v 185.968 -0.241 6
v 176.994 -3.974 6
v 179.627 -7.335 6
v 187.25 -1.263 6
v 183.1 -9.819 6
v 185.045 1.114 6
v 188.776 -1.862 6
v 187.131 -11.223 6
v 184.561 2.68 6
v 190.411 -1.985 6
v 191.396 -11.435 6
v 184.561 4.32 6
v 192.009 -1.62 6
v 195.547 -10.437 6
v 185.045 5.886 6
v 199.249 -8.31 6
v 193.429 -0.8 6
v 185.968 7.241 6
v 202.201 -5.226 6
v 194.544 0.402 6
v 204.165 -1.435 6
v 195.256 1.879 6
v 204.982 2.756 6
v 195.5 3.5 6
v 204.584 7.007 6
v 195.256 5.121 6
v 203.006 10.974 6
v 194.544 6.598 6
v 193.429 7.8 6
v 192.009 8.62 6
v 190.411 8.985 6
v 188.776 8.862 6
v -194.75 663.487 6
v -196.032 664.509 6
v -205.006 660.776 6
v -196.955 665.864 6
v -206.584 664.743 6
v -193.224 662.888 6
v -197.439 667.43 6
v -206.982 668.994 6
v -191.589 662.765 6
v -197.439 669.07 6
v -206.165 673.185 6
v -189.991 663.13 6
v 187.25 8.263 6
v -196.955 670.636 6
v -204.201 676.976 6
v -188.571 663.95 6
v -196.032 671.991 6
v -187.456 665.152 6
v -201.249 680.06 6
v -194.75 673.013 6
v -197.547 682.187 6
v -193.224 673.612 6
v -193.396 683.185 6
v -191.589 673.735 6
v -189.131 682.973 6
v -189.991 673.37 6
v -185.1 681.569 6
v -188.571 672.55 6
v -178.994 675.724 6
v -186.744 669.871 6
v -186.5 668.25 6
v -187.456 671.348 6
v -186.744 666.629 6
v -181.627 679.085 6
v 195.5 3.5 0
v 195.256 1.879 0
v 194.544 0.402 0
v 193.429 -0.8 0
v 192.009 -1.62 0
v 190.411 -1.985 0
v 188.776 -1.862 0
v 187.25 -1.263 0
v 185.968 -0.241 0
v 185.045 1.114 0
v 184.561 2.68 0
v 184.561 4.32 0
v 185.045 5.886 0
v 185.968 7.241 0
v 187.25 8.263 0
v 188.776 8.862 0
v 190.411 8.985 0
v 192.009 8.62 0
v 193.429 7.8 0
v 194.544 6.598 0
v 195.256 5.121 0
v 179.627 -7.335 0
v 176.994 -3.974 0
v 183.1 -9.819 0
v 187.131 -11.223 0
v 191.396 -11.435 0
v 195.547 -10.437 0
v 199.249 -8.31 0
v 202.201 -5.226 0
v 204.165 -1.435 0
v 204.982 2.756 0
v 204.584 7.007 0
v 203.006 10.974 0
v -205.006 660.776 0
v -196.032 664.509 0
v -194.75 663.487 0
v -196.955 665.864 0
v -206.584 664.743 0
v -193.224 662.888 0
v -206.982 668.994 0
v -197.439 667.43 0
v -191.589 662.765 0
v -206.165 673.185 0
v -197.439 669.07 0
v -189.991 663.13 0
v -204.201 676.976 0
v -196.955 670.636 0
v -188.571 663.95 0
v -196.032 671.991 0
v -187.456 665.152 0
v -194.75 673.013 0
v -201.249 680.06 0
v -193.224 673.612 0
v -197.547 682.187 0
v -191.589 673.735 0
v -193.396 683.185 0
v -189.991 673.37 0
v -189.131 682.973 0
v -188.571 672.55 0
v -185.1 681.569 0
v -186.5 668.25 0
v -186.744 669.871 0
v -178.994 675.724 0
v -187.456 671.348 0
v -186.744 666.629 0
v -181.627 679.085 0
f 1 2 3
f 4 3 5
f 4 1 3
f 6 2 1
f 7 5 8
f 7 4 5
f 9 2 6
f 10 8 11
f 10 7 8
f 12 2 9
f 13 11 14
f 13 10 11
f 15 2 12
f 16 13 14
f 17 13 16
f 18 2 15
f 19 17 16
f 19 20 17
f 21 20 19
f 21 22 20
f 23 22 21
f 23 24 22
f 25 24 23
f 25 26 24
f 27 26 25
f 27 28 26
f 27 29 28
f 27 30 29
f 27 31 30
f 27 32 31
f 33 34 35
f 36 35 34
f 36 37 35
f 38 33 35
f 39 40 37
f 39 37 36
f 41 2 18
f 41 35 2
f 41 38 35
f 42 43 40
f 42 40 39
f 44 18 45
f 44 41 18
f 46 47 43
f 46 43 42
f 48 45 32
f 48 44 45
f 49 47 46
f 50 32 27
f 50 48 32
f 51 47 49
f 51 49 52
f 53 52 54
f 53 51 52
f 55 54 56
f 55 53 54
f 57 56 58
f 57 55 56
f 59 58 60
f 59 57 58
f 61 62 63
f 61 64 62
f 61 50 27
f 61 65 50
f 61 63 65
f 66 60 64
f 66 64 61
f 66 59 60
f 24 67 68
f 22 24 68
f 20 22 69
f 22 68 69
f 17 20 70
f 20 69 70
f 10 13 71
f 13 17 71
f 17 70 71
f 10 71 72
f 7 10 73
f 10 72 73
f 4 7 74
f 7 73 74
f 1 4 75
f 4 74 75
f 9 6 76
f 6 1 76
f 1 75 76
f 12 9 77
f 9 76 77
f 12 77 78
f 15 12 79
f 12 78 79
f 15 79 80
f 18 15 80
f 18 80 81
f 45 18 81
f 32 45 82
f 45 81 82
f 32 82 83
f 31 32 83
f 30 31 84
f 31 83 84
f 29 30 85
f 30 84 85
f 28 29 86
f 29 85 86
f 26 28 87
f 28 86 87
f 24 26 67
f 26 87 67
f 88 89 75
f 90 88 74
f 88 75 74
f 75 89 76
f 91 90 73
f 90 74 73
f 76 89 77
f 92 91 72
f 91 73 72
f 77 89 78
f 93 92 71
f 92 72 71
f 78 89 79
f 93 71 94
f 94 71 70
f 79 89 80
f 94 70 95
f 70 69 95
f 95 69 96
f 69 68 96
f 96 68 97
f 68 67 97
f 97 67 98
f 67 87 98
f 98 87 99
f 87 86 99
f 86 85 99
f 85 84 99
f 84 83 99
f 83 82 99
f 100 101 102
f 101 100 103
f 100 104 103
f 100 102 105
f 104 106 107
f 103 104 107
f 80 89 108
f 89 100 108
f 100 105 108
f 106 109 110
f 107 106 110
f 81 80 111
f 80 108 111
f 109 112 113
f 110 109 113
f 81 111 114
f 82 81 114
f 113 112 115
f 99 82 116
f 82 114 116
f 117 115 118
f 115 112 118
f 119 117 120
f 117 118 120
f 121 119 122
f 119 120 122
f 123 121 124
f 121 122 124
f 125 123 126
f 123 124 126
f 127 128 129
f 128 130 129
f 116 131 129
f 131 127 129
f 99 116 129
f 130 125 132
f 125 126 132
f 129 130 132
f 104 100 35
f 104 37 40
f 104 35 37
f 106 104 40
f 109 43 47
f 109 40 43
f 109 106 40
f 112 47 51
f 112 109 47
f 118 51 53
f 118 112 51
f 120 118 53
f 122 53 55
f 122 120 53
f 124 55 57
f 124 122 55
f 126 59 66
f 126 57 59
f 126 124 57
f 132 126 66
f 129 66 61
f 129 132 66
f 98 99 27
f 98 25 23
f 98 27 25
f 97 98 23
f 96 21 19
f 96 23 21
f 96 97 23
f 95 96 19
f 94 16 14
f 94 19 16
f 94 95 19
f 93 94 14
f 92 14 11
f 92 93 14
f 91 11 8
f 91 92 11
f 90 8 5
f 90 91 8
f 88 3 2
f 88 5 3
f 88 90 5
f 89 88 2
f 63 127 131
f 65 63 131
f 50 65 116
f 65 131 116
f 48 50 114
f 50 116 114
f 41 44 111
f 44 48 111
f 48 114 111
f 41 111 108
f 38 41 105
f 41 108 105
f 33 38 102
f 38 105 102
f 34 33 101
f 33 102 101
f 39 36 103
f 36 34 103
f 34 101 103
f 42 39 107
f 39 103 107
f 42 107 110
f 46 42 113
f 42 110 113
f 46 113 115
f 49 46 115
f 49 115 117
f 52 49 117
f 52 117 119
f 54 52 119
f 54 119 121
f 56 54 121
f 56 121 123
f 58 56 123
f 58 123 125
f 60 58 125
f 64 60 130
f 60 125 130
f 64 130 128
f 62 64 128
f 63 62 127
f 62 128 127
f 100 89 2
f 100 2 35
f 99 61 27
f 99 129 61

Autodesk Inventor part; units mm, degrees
ref_plane "YZ Plane" through (0, 0, 0) normal (1, 0, 0) x (0, 1, 0)
ref_plane "XZ Plane" through (0, 0, 0) normal (0, 1, 0) x (-1, 0, 0)
ref_plane "XY Plane" through (0, 0, 0) normal (0, 0, 1) x (1, 0, 0)
sketch "Sketch1" plane through (0, 0, 0) normal (0, 0, 1) x (1, 0, 0)
  circle A0 centre (190, 3.5) radius 5.5 projected
  circle A1 centre (-192, 668.25) radius 5.5 projected
  arc A2 (176.9945, -3.9737) -> (203.0055, 10.9737) centre (190, 3.5) ccw
  arc A3 (-178.9945, 675.7237) -> (-205.0055, 660.7763) centre (-192, 668.25) ccw
  circle A4 centre (190, 3.5) radius 5.5
  circle A5 centre (-192, 668.25) radius 5.5
  line L0 (-178.9945, 675.7237) -> (203.0055, 10.9737)
  line L1 (176.9945, -3.9737) -> (-205.0055, 660.7763)
  point P0 (0, 0)
  dimension "d2" = 11
  dimension "d3" = 30
  dimension "d4" = 11
  dimension "d5" = 30
extrude "Extrusion2" add sketch "Sketch1" along normal blind 6
properties part number "90-08-1550" material "Steel, Mild"
